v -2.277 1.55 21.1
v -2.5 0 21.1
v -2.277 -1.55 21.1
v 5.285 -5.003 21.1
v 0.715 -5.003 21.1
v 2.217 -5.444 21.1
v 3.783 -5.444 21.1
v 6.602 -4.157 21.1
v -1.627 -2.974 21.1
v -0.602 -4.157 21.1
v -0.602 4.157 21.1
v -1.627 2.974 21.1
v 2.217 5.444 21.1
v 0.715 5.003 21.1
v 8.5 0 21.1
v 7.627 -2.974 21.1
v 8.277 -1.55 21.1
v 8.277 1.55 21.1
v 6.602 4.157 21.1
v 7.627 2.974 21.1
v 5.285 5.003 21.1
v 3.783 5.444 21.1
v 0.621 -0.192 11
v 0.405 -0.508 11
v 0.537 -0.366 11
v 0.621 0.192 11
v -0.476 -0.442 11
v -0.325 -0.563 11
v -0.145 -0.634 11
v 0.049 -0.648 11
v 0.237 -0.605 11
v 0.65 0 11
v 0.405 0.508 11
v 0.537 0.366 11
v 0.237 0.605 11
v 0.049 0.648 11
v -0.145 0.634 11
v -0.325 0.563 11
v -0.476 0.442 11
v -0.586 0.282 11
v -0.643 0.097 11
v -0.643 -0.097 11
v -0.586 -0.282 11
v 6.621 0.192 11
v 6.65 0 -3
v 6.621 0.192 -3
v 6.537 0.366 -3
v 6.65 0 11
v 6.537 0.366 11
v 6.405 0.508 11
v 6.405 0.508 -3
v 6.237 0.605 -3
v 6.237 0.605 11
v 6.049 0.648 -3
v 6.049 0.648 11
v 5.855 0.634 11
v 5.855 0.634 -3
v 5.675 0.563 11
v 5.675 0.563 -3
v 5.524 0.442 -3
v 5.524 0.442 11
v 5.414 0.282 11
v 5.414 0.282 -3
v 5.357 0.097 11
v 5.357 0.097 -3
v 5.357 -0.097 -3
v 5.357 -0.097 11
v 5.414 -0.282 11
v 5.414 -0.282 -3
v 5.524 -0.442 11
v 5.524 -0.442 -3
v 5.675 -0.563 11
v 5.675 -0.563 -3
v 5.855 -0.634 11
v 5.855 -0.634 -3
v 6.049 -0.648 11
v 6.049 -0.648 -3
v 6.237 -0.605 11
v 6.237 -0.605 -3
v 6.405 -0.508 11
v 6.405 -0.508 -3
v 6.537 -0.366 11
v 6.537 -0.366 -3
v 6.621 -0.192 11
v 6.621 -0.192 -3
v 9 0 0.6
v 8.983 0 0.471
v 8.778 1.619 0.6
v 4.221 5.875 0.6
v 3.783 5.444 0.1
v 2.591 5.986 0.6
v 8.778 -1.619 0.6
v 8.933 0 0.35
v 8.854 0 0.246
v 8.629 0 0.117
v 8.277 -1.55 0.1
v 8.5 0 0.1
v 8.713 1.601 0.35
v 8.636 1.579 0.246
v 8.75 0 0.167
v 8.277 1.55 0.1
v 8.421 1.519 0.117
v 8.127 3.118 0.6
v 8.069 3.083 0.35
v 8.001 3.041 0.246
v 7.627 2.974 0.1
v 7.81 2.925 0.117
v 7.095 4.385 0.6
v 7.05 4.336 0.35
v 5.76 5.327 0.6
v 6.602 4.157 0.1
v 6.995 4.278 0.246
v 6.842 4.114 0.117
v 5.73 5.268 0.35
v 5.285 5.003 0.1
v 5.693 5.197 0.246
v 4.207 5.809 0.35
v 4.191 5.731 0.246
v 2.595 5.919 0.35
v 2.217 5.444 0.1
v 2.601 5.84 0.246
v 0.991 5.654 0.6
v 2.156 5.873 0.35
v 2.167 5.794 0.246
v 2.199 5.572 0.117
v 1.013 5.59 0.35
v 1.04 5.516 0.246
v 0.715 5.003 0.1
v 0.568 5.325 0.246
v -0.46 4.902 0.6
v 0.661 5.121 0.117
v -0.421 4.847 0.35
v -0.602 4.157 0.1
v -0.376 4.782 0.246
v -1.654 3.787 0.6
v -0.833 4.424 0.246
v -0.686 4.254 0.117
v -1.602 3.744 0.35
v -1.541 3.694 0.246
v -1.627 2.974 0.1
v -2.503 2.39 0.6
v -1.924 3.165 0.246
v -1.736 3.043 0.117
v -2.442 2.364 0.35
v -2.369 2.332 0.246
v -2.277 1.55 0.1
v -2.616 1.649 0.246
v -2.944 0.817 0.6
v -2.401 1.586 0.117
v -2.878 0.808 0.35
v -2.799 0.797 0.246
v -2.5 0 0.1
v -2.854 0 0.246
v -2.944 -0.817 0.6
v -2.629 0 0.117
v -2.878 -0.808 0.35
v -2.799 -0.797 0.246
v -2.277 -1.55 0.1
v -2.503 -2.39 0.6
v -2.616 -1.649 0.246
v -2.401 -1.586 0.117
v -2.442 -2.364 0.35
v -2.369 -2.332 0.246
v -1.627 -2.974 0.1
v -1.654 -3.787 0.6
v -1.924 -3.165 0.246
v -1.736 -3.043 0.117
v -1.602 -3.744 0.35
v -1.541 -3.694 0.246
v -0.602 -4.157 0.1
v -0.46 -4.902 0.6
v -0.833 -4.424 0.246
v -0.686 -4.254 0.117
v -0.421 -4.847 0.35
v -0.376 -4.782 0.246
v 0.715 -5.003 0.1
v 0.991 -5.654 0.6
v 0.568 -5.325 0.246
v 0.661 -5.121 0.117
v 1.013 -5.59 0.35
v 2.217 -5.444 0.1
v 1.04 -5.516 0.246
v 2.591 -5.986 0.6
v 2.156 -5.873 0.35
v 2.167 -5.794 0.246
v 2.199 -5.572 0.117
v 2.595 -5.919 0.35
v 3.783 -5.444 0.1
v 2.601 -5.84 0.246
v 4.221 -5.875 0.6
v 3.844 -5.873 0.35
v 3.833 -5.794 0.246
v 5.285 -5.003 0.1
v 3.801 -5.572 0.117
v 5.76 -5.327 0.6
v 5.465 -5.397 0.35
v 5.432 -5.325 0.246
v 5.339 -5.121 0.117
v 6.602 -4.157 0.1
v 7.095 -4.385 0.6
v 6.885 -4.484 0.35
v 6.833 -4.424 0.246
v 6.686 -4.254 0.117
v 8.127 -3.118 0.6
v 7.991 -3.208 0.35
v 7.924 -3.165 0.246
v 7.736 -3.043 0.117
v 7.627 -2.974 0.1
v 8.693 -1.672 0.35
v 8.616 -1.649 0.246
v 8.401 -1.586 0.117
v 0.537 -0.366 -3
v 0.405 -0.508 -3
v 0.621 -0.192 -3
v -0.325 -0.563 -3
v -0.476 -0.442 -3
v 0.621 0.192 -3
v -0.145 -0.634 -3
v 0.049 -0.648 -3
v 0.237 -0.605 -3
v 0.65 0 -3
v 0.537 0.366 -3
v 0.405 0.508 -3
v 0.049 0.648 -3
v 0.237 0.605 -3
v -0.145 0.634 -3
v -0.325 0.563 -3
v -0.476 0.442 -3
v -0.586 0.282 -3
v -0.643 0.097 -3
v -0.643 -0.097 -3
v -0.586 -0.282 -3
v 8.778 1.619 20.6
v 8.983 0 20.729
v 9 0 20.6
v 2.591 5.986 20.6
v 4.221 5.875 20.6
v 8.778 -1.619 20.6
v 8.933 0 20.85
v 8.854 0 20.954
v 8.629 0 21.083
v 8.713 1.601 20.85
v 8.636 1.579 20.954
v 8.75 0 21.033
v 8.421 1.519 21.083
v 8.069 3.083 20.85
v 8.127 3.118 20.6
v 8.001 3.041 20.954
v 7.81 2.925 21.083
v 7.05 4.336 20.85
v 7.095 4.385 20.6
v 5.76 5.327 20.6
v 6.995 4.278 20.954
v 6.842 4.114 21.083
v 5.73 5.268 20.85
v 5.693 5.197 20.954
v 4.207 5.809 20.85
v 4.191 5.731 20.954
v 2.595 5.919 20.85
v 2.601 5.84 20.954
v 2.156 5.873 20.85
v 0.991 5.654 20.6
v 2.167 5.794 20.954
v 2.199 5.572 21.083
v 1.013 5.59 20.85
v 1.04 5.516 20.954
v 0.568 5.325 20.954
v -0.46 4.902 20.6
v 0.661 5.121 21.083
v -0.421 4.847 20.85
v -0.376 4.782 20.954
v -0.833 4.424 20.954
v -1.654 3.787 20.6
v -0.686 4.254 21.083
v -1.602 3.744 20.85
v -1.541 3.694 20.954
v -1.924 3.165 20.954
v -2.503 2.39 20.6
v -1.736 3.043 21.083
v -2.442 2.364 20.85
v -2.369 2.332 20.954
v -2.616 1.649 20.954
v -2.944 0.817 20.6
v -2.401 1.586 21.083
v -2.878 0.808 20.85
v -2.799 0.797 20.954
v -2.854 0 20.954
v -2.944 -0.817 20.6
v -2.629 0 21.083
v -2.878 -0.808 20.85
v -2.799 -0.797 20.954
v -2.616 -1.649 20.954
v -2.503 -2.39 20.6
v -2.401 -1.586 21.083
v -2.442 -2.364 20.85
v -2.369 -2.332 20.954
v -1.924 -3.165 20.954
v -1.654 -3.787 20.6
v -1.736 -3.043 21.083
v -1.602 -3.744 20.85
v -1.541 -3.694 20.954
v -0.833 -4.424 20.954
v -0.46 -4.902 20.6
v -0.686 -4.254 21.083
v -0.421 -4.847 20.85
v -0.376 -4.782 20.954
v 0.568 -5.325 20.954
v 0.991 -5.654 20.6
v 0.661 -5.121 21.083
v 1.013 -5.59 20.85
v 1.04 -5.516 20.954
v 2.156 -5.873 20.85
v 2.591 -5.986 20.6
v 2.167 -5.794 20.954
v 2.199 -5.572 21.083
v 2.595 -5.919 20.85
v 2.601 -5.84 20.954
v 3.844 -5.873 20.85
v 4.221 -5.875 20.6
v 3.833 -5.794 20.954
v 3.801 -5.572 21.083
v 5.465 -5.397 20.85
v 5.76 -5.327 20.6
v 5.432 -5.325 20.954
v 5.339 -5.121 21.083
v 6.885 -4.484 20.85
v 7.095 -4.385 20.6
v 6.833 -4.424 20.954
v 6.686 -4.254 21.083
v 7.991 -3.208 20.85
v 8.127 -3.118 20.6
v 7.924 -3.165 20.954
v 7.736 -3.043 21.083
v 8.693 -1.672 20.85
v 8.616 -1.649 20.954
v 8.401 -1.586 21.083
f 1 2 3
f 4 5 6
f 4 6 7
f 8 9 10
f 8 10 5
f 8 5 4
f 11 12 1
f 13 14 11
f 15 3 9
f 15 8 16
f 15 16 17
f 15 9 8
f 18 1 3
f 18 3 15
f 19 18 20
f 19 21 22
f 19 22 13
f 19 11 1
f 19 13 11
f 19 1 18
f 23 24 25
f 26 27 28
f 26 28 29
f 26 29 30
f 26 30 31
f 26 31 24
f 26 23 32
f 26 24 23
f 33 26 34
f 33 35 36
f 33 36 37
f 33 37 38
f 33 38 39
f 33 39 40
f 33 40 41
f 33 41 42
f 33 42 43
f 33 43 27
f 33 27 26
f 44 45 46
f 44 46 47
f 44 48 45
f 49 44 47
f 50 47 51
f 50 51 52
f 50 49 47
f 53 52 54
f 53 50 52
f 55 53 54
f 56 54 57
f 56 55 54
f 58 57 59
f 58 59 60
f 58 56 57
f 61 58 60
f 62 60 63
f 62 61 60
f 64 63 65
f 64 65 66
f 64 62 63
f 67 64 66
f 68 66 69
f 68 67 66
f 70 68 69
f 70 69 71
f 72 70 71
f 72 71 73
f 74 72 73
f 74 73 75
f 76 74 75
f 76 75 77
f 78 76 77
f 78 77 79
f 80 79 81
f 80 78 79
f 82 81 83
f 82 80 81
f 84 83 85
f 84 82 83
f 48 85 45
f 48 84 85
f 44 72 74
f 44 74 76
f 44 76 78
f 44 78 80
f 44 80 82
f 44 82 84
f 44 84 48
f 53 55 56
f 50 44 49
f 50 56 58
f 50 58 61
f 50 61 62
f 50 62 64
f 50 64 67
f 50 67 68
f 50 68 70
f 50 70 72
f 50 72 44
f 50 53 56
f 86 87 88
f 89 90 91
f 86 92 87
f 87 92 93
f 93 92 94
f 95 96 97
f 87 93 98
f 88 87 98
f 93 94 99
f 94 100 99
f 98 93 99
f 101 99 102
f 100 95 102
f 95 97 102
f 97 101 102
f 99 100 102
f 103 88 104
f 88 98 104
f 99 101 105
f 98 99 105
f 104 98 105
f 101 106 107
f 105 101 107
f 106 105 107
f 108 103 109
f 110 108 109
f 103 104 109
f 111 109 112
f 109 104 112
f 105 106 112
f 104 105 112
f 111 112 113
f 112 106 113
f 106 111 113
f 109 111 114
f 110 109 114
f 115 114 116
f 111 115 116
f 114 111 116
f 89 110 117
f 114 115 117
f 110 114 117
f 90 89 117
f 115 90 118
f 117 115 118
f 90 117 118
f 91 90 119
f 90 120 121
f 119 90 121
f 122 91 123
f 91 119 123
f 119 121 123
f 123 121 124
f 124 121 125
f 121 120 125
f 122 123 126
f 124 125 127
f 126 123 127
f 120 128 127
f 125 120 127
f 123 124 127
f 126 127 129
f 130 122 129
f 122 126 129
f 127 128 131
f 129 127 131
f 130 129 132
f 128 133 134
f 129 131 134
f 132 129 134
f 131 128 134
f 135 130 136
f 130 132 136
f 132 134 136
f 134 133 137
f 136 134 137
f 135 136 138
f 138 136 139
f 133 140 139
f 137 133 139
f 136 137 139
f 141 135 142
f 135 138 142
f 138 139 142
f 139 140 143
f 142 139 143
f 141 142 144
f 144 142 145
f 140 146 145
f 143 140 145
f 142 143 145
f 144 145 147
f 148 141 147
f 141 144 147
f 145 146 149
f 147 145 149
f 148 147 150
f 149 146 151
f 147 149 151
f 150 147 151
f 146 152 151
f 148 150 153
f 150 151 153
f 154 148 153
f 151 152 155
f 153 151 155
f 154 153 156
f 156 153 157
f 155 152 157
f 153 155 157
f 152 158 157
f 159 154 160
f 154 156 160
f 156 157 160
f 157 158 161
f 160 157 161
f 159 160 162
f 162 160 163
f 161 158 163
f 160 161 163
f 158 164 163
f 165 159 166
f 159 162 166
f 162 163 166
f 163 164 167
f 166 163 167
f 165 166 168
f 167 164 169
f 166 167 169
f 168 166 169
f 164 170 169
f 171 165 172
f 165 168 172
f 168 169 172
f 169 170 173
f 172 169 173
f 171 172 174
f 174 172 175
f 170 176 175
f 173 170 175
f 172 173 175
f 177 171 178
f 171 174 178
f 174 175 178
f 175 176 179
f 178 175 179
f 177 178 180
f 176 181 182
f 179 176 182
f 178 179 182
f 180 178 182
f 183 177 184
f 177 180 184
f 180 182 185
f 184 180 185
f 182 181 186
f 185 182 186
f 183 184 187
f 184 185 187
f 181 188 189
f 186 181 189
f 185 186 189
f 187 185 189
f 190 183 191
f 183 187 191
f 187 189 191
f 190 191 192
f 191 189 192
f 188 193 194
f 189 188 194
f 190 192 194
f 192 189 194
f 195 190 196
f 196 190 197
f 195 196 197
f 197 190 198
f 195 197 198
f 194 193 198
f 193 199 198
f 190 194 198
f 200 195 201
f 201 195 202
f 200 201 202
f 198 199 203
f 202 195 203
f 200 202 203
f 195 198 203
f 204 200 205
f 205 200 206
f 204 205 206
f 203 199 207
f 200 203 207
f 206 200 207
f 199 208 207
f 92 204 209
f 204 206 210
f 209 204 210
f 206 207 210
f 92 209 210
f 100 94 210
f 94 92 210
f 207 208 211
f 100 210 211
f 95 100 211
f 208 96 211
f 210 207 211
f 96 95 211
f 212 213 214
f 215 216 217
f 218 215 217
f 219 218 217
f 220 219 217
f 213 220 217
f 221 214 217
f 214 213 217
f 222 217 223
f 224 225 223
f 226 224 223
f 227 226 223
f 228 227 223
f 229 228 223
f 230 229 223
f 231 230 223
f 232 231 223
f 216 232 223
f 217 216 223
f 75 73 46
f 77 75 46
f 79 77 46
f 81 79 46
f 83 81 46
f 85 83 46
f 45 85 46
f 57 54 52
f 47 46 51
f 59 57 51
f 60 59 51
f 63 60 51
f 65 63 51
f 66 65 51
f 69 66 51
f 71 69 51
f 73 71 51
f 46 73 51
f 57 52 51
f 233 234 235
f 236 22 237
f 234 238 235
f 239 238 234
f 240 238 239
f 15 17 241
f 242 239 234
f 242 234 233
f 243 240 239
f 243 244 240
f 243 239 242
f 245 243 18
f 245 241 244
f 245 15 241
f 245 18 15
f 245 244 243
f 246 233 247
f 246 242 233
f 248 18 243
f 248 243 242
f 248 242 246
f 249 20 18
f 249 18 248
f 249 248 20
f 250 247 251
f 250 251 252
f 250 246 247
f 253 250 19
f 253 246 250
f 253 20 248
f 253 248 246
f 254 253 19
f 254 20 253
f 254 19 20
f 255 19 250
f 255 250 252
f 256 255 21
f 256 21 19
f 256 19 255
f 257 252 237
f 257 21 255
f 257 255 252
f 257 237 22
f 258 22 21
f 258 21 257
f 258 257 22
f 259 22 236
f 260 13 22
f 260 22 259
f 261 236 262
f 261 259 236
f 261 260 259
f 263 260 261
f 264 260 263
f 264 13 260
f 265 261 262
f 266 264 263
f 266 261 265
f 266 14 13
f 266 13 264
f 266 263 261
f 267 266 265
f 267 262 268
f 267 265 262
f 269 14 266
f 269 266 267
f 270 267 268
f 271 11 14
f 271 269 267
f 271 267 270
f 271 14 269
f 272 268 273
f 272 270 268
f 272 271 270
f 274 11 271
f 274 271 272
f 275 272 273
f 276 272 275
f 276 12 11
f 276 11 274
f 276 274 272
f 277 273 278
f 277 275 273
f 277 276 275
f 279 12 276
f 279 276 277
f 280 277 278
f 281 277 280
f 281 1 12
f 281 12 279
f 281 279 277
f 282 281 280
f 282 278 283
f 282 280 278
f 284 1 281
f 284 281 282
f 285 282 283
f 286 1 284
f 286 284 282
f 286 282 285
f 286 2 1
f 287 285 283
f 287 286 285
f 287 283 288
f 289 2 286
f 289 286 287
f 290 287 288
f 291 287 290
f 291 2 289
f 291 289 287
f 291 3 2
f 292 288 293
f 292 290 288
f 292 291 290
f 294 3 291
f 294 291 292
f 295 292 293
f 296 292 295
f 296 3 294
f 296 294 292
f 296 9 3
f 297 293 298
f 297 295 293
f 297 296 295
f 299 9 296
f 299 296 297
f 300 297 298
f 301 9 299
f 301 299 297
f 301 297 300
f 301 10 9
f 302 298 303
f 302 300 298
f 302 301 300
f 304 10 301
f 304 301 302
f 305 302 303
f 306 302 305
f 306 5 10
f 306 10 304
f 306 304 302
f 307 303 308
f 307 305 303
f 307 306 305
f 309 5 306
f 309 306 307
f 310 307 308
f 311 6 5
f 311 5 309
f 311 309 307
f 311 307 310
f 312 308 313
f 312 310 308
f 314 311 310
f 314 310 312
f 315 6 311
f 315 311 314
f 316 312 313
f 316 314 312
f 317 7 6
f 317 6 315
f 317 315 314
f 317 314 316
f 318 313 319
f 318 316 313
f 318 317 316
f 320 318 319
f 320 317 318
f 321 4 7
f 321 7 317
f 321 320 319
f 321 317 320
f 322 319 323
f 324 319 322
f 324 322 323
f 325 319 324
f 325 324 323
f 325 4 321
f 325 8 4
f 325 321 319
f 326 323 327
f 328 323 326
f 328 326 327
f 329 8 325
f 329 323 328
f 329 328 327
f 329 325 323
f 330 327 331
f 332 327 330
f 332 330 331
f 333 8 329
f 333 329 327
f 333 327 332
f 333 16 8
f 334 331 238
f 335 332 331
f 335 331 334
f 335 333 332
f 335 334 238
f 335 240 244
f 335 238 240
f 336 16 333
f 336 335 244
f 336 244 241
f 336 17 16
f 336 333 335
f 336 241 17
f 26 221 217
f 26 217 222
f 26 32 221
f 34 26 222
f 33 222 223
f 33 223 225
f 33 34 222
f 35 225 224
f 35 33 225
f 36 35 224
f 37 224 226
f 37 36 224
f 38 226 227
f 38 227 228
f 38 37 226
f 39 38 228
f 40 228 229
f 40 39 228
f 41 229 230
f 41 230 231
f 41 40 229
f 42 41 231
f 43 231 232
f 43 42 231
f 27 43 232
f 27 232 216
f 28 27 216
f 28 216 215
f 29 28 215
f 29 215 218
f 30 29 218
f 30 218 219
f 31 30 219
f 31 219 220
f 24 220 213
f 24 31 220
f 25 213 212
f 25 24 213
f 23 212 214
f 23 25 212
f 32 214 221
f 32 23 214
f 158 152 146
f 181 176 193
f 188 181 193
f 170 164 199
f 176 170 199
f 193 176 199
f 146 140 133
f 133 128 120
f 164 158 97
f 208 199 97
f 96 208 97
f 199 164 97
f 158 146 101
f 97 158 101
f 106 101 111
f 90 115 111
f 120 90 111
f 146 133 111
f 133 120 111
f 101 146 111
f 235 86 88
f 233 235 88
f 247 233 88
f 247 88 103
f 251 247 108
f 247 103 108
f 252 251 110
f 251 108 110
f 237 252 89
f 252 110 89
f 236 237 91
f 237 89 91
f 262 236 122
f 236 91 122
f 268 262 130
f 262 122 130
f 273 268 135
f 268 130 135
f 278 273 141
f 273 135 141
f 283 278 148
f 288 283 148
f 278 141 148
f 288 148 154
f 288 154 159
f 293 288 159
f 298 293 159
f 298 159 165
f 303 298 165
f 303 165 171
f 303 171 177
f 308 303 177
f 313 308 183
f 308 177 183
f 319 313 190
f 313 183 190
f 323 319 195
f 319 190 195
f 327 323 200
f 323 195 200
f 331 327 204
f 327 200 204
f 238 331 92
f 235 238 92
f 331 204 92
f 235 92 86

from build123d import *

# Parameters (mm, degrees)
SKETCH001_R       = 0.65
PAD001_DEPTH      = 10.5
PAD001_DEPTH_BACK = 3.5
SKETCH_R          = 6
PAD_DEPTH         = 21
FILLET_R          = 0.5


with BuildPart() as pad001:
    # Sketch001 → Pad001 (new body, two sides)
    with BuildSketch(Plane.XY.offset(0.5)) as pad001_sk:
        Circle(SKETCH001_R)
        with Locations((6, 0)):
            Circle(SKETCH001_R)
    extrude(amount=PAD001_DEPTH)
    extrude(pad001_sk.sketch, amount=-PAD001_DEPTH_BACK)


with BuildPart() as fillet_body:
    # Sketch → Pad (new body)
    with BuildSketch(Plane.XY.offset(0.1)):
        with Locations((3, 0)):
            Circle(SKETCH_R)
    extrude(amount=PAD_DEPTH)

    # Fillet
    fillet_edges = [fillet_body.edges().sort_by_distance(p)[0] for p in [
        (-3, 0, 0.1),
        (-3, 0, 21.1),
    ]]
    fillet(fillet_edges, radius=FILLET_R)


solid = Compound([pad001.part, fillet_body.part])
